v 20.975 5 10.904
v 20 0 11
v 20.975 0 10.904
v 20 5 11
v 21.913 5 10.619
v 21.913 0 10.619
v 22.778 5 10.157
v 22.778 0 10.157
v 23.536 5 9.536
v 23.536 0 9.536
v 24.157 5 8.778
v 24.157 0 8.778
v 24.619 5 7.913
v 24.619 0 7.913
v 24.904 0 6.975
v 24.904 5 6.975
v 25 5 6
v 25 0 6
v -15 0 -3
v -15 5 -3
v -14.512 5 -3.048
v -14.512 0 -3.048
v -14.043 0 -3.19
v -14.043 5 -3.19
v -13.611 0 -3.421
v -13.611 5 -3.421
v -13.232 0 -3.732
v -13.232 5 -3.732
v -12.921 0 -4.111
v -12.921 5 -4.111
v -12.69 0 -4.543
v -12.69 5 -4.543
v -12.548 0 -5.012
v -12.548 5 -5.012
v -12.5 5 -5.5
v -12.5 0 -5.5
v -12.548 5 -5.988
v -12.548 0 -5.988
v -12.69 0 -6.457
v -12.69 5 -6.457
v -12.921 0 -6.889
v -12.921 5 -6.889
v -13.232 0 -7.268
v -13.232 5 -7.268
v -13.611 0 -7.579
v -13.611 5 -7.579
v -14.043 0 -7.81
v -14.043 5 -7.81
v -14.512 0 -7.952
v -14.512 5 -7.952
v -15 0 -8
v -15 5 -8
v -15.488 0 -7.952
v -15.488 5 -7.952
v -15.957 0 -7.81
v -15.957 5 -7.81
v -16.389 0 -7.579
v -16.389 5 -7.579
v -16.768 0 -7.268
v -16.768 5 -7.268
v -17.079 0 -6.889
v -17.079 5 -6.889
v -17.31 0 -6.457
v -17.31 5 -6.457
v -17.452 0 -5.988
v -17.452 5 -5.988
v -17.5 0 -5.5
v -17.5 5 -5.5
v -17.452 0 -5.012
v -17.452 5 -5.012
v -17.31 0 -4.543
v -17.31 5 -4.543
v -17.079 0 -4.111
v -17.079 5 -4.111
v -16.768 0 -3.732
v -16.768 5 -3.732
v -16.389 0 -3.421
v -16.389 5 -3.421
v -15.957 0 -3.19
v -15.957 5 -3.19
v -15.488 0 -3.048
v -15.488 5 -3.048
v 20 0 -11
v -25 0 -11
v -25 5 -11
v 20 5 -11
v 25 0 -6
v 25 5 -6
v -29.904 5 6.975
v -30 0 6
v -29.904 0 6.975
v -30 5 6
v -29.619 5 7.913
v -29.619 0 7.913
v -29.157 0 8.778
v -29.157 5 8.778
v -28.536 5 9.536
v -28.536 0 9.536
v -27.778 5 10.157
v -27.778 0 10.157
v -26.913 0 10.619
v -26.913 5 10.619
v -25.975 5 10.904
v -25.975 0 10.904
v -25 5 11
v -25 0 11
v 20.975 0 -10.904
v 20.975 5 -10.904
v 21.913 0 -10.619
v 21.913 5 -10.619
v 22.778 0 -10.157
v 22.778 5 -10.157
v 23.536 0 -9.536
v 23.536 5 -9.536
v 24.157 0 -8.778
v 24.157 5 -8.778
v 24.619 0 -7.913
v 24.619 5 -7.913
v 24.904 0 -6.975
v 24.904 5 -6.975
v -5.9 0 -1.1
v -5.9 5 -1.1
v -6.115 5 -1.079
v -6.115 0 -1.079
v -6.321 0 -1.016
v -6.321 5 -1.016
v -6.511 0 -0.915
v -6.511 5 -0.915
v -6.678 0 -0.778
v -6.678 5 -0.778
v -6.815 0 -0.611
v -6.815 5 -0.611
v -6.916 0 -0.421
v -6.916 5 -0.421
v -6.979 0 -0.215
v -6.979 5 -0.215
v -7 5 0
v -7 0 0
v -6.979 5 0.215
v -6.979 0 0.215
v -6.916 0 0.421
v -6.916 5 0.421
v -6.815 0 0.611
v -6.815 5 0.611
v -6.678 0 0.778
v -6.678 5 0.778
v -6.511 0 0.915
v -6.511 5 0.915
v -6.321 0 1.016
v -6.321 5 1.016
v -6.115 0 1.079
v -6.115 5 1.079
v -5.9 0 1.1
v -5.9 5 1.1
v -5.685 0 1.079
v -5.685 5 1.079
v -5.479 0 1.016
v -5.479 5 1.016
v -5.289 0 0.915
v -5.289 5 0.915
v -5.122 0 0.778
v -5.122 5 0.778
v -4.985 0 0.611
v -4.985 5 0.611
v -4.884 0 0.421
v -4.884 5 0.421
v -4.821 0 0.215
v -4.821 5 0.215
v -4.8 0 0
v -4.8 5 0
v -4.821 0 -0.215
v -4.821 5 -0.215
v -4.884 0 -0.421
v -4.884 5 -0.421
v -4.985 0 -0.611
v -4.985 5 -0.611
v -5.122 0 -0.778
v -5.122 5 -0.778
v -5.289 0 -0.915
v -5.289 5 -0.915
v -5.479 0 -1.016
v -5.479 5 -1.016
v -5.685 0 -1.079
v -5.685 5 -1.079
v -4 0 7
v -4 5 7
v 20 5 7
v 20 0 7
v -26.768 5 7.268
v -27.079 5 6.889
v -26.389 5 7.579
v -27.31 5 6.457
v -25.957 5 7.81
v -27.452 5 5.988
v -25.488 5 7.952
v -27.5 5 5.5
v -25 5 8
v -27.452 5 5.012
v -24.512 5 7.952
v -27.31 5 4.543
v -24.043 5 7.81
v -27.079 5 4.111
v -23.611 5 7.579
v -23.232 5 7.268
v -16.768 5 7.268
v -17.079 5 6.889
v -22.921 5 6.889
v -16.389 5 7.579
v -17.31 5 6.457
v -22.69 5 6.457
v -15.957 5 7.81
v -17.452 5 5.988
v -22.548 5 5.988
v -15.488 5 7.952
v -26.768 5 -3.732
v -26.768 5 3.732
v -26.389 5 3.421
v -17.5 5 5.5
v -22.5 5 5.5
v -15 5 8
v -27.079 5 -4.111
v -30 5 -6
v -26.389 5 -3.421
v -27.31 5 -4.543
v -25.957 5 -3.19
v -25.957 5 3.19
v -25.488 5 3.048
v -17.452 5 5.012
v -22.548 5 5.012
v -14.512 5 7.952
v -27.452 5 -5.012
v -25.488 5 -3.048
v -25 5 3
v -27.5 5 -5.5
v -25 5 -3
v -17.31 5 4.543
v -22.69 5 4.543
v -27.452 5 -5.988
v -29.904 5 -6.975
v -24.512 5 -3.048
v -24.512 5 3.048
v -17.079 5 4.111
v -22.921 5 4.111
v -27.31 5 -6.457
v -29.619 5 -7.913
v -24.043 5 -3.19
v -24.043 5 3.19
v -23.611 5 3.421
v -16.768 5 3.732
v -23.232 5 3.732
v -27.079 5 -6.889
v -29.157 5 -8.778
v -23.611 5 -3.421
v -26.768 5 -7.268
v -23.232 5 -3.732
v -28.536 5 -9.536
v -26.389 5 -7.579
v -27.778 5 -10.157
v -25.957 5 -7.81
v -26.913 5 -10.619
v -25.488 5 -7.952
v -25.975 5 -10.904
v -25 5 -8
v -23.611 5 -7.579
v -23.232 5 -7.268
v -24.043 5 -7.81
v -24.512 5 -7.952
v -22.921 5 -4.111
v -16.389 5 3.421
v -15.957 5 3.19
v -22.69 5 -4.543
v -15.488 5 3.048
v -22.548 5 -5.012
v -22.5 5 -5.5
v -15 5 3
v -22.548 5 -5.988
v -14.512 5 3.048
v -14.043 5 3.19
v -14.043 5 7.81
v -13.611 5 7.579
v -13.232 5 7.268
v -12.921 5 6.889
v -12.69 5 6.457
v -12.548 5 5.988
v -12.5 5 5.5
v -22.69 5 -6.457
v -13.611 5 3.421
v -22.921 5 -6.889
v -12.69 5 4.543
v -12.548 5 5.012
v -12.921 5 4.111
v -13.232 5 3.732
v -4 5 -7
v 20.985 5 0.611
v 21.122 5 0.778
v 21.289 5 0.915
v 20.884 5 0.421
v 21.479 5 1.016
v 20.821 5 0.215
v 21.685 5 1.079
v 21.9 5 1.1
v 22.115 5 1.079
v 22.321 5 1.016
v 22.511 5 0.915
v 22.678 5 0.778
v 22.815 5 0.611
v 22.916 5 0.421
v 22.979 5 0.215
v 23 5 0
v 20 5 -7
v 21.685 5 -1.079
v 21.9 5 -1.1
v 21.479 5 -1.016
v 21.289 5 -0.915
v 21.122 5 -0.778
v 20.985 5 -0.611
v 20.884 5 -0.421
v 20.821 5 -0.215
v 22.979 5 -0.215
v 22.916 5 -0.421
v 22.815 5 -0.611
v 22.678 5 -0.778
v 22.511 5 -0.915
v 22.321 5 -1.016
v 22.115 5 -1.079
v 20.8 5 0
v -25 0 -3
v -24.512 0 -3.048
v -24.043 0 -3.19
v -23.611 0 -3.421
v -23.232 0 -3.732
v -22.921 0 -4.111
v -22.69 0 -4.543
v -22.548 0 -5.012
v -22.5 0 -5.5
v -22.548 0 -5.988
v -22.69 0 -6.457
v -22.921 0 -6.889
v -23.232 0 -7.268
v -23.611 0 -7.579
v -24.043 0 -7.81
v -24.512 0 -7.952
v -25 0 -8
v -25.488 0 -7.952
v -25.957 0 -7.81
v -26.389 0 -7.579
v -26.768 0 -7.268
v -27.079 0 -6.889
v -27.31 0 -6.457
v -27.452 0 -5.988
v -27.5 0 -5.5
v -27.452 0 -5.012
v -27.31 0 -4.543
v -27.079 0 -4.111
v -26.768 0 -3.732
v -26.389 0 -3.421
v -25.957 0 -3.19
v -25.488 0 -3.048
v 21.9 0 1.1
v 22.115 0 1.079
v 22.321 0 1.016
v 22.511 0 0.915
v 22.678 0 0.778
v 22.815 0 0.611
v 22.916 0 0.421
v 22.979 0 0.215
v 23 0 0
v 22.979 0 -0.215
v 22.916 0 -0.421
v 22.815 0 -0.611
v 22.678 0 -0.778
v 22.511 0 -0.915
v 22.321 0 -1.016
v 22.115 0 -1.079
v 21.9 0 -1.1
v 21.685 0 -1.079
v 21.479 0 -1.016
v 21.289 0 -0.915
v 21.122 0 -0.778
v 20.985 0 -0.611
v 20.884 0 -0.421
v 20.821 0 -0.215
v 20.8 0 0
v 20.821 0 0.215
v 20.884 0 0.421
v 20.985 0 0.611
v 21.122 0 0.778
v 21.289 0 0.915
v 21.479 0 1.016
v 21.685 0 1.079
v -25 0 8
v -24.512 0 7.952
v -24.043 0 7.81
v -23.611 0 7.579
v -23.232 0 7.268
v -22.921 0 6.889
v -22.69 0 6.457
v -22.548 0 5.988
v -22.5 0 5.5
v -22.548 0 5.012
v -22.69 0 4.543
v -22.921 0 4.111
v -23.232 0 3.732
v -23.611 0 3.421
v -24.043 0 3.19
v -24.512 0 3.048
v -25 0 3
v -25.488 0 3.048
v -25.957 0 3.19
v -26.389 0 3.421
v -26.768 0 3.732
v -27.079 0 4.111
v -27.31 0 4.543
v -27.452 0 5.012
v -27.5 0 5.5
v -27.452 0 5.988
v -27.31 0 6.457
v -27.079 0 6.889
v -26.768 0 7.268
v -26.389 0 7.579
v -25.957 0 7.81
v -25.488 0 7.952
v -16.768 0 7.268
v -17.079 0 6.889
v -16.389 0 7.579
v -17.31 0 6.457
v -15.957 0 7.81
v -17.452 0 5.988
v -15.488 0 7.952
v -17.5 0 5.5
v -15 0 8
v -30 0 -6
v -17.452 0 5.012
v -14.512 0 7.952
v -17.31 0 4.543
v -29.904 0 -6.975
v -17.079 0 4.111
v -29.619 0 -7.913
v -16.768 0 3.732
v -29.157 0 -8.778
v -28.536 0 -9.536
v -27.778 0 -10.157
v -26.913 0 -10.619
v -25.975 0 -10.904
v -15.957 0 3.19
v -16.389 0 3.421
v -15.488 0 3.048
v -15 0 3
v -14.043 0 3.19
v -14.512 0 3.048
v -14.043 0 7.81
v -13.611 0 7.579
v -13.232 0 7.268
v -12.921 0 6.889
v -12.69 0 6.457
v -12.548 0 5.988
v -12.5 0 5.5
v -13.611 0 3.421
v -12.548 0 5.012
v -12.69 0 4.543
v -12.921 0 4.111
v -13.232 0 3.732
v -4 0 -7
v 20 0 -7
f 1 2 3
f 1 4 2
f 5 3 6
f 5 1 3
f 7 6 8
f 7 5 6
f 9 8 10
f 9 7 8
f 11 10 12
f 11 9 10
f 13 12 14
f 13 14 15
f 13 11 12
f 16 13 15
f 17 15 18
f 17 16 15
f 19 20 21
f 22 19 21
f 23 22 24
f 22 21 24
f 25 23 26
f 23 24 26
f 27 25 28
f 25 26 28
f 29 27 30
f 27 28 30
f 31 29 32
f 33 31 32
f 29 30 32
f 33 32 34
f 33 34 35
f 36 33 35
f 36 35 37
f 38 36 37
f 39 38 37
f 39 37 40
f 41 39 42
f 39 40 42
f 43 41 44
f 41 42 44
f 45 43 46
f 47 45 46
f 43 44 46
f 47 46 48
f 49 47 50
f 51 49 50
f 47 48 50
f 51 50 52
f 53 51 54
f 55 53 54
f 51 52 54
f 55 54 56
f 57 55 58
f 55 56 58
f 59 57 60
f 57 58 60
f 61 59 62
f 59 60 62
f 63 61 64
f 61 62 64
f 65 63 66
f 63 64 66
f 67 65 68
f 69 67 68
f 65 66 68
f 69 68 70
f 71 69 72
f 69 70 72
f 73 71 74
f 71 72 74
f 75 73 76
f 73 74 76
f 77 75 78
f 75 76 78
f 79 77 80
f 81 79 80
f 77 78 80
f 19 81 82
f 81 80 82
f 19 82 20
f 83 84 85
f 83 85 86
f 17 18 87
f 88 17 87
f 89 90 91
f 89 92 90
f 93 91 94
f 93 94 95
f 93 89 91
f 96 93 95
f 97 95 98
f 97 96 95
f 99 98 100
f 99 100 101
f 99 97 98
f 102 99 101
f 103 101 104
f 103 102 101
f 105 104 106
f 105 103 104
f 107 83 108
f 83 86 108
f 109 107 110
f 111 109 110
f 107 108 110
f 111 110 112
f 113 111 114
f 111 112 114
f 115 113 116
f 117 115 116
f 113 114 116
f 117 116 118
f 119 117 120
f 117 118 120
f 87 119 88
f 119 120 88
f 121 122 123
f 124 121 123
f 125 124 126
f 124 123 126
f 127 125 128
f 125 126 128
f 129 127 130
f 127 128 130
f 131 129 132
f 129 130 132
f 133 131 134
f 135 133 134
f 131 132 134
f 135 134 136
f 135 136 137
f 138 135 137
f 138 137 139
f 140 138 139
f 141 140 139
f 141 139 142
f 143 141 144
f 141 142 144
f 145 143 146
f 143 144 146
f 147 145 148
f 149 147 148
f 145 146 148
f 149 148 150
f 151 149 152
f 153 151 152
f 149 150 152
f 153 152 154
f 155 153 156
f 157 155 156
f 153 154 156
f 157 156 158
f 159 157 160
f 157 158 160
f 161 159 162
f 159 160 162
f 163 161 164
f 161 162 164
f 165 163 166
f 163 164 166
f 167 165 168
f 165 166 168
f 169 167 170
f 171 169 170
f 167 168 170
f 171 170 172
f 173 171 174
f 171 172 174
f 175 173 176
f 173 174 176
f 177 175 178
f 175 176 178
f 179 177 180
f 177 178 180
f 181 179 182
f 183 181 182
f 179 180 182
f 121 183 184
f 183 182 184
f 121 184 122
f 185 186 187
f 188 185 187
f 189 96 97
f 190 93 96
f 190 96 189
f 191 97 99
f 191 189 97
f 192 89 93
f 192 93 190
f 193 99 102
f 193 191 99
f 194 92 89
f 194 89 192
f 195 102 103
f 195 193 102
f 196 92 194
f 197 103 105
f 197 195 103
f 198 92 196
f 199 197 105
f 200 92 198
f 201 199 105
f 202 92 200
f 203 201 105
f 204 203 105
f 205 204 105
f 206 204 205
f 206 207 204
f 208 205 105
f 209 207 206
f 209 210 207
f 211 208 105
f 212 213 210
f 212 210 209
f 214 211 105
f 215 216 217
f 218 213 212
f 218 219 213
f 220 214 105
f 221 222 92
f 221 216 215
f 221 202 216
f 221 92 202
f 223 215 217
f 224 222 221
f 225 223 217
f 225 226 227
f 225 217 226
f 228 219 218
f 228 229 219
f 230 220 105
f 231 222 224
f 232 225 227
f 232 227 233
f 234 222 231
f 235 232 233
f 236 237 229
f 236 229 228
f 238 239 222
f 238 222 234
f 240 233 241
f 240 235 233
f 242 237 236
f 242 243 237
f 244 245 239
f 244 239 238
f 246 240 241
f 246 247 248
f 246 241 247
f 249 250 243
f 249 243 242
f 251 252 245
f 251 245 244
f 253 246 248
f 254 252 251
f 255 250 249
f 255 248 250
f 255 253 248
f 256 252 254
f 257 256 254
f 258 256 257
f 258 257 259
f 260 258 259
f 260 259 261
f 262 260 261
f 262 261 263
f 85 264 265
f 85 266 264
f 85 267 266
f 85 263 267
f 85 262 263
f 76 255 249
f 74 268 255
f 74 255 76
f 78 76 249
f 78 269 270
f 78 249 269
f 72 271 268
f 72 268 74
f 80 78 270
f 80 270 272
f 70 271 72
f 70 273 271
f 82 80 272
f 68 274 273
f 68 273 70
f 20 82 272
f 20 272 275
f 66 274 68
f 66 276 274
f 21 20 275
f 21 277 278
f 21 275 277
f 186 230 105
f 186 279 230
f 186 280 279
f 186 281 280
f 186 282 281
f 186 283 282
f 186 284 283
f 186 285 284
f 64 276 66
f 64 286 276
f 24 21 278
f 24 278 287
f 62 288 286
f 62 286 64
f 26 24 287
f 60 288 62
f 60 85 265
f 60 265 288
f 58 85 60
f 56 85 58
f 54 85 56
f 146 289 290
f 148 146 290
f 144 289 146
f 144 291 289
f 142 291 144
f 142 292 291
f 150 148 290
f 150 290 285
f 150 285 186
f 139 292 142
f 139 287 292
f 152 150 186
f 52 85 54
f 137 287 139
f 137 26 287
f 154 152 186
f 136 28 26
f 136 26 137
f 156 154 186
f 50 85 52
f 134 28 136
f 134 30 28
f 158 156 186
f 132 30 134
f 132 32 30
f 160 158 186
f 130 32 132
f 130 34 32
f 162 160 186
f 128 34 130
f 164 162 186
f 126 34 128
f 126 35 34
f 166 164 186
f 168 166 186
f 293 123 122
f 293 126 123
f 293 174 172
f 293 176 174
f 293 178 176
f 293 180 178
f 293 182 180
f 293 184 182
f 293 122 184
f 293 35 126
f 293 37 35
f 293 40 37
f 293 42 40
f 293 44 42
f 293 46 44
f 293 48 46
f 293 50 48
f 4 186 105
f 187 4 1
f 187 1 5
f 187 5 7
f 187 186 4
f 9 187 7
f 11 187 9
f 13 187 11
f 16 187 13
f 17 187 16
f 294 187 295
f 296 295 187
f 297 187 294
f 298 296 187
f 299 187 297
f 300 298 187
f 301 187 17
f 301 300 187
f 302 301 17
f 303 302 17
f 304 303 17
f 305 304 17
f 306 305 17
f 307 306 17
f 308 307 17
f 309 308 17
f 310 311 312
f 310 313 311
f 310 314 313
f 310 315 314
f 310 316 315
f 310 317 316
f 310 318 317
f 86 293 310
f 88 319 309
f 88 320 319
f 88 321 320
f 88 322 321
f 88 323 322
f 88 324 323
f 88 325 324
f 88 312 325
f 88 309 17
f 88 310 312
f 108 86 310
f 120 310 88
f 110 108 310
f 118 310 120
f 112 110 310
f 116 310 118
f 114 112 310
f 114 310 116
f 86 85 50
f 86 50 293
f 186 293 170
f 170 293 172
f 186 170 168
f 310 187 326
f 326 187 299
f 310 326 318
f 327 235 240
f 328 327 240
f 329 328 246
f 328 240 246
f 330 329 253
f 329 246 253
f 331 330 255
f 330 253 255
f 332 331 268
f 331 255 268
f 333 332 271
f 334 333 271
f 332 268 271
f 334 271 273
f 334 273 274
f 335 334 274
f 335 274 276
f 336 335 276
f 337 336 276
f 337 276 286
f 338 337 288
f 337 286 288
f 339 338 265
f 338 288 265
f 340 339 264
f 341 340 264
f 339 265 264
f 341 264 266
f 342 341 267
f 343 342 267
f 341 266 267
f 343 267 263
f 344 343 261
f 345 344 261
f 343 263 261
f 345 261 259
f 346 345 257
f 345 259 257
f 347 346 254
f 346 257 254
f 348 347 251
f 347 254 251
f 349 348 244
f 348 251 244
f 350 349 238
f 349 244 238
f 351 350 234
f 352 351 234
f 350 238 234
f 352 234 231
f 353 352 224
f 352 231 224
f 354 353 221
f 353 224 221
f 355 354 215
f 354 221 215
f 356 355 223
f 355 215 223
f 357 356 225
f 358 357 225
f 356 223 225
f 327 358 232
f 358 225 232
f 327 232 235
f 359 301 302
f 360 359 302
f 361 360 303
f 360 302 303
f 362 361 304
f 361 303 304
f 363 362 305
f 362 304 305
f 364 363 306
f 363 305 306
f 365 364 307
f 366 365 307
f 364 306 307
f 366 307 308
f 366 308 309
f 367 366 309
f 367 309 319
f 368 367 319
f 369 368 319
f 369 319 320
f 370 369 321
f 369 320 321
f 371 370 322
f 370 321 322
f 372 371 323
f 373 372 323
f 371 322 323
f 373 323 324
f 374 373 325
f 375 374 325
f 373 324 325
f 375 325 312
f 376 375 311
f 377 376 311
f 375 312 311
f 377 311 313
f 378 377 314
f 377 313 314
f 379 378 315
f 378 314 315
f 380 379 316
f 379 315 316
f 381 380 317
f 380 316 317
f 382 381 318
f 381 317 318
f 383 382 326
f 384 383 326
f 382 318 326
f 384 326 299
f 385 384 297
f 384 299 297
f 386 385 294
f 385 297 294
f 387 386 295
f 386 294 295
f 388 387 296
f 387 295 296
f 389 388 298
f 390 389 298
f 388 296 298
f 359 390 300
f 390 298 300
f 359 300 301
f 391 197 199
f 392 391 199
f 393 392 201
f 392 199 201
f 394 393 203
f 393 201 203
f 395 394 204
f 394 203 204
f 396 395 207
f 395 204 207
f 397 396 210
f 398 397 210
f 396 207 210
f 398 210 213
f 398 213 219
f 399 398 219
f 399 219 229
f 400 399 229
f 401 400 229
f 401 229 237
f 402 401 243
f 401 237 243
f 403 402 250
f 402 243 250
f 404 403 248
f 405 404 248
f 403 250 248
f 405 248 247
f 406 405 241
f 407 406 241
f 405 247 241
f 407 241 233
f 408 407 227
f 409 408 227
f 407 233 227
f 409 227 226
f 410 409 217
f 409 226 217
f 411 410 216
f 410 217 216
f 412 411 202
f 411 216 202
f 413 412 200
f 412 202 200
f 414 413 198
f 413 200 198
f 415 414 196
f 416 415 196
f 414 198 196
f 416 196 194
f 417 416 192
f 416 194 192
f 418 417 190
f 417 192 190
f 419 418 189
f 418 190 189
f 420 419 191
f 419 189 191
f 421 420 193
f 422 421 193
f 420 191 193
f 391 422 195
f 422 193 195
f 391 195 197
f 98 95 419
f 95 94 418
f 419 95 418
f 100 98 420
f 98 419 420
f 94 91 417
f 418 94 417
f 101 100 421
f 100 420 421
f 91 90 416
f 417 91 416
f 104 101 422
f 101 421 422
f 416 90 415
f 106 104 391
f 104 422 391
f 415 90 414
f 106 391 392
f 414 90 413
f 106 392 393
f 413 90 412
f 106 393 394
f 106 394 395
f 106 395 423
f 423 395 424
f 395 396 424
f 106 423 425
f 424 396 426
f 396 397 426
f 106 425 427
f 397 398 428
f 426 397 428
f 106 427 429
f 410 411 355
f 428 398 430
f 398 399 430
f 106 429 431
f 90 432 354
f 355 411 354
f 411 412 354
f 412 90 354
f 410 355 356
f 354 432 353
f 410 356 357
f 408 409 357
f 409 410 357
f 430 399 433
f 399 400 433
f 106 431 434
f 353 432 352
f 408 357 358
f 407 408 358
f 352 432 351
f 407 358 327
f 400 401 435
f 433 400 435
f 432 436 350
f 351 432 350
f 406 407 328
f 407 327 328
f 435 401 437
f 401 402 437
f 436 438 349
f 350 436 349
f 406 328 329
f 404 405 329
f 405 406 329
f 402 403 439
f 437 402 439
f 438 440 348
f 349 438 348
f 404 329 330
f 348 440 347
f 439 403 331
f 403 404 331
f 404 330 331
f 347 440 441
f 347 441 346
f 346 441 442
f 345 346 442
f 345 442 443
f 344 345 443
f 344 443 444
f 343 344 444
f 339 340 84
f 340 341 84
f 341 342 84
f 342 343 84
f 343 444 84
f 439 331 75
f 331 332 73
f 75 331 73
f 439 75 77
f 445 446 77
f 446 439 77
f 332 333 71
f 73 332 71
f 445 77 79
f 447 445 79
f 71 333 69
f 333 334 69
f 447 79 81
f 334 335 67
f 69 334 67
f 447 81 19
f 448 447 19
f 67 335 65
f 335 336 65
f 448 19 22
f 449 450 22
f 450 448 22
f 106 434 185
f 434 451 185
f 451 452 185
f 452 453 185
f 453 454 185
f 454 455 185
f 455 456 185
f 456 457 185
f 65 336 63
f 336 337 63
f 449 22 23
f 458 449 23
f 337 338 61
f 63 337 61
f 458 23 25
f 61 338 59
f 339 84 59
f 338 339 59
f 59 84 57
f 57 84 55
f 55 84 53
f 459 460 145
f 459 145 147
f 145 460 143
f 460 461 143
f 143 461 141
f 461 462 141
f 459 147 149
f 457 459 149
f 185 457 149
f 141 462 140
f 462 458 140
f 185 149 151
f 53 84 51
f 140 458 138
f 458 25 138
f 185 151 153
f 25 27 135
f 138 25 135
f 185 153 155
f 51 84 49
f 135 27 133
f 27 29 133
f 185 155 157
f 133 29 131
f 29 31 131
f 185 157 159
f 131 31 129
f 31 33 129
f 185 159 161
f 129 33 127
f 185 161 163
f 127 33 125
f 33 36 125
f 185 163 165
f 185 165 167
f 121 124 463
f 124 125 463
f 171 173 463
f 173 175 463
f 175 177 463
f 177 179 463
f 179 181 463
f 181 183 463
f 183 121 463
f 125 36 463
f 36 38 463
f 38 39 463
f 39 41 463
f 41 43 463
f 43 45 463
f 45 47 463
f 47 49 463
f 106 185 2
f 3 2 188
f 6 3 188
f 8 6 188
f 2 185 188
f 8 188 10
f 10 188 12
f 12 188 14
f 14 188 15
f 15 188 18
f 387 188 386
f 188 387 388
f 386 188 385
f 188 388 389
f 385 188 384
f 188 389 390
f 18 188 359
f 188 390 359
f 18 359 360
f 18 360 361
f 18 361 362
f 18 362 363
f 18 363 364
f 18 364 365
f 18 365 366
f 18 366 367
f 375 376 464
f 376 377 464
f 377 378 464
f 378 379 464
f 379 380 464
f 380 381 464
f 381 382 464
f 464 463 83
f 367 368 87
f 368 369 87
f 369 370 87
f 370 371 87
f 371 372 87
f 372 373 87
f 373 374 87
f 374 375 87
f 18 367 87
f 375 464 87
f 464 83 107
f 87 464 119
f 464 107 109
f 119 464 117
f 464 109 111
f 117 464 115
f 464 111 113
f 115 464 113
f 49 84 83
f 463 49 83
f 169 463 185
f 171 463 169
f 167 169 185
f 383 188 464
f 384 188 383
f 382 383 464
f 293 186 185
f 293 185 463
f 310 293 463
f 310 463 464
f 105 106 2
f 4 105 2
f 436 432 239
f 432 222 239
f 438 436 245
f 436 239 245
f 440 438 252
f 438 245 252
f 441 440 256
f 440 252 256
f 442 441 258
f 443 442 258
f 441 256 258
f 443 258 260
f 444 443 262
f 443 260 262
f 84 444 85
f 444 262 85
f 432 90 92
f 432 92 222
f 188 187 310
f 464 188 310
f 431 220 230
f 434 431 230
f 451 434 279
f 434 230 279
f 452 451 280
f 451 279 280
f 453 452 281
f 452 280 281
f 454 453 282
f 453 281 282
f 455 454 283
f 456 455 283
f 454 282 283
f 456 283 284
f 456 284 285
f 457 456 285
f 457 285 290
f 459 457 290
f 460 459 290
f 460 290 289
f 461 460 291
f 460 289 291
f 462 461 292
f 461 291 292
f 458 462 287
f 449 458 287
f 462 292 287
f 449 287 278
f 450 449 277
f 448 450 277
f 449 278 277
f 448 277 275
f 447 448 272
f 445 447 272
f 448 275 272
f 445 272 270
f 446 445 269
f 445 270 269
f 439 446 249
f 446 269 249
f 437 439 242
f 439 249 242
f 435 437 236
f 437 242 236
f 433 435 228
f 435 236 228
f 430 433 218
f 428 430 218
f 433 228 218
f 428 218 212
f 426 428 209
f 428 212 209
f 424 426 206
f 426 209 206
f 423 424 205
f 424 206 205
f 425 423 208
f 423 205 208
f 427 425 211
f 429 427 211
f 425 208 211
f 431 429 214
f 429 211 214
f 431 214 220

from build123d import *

# Parameters (mm, degrees)
SKETCH1_W           = 55
SKETCH1_H           = 22
BOSS_EXTRUDE1_DEPTH = 5
SKETCH2_R           = 2.5
CUT_EXTRUDE1_DEPTH  = 5
FILLET1_R           = 5
SKETCH4_R           = 1.1
SKETCH4_W           = 24
SKETCH4_H           = 14
CUT_EXTRUDE2_DEPTH  = 5


with BuildPart() as part:
    # Sketch1 → Boss-Extrude1 (new body)
    with BuildSketch(Plane(origin=(0, 0, 0), x_dir=(1, 0, 0), z_dir=(0, 1, 0))):
        with Locations((-2.5, 0)):
            Rectangle(SKETCH1_W, SKETCH1_H)
    extrude(amount=BOSS_EXTRUDE1_DEPTH)

    # Sketch2 → Cut-Extrude1 (cut)
    with BuildSketch(Plane(origin=(0, 5, 0), x_dir=(1, 0, 0), z_dir=(0, 1, 0))):
        with Locations(Location((-25, 5.5, 0), (0, 0, 270))):
            Circle(SKETCH2_R)
        with Locations(Location((-15, 5.5, 0), (0, 0, 270))):
            Circle(SKETCH2_R)
        with Locations(Location((-25, -5.5, 0), (0, 0, 270))):
            Circle(SKETCH2_R)
        with Locations(Location((-15, -5.5, 0), (0, 0, 270))):
            Circle(SKETCH2_R)
    extrude(amount=-CUT_EXTRUDE1_DEPTH, mode=Mode.SUBTRACT)

    # Fillet1
    fillet1_edges = [part.edges().sort_by_distance(p)[0] for p in [
        (-30, 2.5, -11),
        (25, 2.5, -11),
        (25, 2.5, 11),
        (-30, 2.5, 11),
    ]]
    fillet(fillet1_edges, radius=FILLET1_R)

    # Sketch4 → Cut-Extrude2 (cut)
    with BuildSketch(Plane(origin=(0, 5, 0), x_dir=(1, 0, 0), z_dir=(0, 1, 0))):
        with Locations(Location((21.9, 0, 0), (0, 0, 270))):
            Circle(SKETCH4_R)
        with Locations(Location((-5.9, 0, 0), (0, 0, 90))):
            Circle(SKETCH4_R)
        with Locations((8, 0)):
            Rectangle(SKETCH4_W, SKETCH4_H)
    extrude(amount=-CUT_EXTRUDE2_DEPTH, mode=Mode.SUBTRACT)


solid = part.part
